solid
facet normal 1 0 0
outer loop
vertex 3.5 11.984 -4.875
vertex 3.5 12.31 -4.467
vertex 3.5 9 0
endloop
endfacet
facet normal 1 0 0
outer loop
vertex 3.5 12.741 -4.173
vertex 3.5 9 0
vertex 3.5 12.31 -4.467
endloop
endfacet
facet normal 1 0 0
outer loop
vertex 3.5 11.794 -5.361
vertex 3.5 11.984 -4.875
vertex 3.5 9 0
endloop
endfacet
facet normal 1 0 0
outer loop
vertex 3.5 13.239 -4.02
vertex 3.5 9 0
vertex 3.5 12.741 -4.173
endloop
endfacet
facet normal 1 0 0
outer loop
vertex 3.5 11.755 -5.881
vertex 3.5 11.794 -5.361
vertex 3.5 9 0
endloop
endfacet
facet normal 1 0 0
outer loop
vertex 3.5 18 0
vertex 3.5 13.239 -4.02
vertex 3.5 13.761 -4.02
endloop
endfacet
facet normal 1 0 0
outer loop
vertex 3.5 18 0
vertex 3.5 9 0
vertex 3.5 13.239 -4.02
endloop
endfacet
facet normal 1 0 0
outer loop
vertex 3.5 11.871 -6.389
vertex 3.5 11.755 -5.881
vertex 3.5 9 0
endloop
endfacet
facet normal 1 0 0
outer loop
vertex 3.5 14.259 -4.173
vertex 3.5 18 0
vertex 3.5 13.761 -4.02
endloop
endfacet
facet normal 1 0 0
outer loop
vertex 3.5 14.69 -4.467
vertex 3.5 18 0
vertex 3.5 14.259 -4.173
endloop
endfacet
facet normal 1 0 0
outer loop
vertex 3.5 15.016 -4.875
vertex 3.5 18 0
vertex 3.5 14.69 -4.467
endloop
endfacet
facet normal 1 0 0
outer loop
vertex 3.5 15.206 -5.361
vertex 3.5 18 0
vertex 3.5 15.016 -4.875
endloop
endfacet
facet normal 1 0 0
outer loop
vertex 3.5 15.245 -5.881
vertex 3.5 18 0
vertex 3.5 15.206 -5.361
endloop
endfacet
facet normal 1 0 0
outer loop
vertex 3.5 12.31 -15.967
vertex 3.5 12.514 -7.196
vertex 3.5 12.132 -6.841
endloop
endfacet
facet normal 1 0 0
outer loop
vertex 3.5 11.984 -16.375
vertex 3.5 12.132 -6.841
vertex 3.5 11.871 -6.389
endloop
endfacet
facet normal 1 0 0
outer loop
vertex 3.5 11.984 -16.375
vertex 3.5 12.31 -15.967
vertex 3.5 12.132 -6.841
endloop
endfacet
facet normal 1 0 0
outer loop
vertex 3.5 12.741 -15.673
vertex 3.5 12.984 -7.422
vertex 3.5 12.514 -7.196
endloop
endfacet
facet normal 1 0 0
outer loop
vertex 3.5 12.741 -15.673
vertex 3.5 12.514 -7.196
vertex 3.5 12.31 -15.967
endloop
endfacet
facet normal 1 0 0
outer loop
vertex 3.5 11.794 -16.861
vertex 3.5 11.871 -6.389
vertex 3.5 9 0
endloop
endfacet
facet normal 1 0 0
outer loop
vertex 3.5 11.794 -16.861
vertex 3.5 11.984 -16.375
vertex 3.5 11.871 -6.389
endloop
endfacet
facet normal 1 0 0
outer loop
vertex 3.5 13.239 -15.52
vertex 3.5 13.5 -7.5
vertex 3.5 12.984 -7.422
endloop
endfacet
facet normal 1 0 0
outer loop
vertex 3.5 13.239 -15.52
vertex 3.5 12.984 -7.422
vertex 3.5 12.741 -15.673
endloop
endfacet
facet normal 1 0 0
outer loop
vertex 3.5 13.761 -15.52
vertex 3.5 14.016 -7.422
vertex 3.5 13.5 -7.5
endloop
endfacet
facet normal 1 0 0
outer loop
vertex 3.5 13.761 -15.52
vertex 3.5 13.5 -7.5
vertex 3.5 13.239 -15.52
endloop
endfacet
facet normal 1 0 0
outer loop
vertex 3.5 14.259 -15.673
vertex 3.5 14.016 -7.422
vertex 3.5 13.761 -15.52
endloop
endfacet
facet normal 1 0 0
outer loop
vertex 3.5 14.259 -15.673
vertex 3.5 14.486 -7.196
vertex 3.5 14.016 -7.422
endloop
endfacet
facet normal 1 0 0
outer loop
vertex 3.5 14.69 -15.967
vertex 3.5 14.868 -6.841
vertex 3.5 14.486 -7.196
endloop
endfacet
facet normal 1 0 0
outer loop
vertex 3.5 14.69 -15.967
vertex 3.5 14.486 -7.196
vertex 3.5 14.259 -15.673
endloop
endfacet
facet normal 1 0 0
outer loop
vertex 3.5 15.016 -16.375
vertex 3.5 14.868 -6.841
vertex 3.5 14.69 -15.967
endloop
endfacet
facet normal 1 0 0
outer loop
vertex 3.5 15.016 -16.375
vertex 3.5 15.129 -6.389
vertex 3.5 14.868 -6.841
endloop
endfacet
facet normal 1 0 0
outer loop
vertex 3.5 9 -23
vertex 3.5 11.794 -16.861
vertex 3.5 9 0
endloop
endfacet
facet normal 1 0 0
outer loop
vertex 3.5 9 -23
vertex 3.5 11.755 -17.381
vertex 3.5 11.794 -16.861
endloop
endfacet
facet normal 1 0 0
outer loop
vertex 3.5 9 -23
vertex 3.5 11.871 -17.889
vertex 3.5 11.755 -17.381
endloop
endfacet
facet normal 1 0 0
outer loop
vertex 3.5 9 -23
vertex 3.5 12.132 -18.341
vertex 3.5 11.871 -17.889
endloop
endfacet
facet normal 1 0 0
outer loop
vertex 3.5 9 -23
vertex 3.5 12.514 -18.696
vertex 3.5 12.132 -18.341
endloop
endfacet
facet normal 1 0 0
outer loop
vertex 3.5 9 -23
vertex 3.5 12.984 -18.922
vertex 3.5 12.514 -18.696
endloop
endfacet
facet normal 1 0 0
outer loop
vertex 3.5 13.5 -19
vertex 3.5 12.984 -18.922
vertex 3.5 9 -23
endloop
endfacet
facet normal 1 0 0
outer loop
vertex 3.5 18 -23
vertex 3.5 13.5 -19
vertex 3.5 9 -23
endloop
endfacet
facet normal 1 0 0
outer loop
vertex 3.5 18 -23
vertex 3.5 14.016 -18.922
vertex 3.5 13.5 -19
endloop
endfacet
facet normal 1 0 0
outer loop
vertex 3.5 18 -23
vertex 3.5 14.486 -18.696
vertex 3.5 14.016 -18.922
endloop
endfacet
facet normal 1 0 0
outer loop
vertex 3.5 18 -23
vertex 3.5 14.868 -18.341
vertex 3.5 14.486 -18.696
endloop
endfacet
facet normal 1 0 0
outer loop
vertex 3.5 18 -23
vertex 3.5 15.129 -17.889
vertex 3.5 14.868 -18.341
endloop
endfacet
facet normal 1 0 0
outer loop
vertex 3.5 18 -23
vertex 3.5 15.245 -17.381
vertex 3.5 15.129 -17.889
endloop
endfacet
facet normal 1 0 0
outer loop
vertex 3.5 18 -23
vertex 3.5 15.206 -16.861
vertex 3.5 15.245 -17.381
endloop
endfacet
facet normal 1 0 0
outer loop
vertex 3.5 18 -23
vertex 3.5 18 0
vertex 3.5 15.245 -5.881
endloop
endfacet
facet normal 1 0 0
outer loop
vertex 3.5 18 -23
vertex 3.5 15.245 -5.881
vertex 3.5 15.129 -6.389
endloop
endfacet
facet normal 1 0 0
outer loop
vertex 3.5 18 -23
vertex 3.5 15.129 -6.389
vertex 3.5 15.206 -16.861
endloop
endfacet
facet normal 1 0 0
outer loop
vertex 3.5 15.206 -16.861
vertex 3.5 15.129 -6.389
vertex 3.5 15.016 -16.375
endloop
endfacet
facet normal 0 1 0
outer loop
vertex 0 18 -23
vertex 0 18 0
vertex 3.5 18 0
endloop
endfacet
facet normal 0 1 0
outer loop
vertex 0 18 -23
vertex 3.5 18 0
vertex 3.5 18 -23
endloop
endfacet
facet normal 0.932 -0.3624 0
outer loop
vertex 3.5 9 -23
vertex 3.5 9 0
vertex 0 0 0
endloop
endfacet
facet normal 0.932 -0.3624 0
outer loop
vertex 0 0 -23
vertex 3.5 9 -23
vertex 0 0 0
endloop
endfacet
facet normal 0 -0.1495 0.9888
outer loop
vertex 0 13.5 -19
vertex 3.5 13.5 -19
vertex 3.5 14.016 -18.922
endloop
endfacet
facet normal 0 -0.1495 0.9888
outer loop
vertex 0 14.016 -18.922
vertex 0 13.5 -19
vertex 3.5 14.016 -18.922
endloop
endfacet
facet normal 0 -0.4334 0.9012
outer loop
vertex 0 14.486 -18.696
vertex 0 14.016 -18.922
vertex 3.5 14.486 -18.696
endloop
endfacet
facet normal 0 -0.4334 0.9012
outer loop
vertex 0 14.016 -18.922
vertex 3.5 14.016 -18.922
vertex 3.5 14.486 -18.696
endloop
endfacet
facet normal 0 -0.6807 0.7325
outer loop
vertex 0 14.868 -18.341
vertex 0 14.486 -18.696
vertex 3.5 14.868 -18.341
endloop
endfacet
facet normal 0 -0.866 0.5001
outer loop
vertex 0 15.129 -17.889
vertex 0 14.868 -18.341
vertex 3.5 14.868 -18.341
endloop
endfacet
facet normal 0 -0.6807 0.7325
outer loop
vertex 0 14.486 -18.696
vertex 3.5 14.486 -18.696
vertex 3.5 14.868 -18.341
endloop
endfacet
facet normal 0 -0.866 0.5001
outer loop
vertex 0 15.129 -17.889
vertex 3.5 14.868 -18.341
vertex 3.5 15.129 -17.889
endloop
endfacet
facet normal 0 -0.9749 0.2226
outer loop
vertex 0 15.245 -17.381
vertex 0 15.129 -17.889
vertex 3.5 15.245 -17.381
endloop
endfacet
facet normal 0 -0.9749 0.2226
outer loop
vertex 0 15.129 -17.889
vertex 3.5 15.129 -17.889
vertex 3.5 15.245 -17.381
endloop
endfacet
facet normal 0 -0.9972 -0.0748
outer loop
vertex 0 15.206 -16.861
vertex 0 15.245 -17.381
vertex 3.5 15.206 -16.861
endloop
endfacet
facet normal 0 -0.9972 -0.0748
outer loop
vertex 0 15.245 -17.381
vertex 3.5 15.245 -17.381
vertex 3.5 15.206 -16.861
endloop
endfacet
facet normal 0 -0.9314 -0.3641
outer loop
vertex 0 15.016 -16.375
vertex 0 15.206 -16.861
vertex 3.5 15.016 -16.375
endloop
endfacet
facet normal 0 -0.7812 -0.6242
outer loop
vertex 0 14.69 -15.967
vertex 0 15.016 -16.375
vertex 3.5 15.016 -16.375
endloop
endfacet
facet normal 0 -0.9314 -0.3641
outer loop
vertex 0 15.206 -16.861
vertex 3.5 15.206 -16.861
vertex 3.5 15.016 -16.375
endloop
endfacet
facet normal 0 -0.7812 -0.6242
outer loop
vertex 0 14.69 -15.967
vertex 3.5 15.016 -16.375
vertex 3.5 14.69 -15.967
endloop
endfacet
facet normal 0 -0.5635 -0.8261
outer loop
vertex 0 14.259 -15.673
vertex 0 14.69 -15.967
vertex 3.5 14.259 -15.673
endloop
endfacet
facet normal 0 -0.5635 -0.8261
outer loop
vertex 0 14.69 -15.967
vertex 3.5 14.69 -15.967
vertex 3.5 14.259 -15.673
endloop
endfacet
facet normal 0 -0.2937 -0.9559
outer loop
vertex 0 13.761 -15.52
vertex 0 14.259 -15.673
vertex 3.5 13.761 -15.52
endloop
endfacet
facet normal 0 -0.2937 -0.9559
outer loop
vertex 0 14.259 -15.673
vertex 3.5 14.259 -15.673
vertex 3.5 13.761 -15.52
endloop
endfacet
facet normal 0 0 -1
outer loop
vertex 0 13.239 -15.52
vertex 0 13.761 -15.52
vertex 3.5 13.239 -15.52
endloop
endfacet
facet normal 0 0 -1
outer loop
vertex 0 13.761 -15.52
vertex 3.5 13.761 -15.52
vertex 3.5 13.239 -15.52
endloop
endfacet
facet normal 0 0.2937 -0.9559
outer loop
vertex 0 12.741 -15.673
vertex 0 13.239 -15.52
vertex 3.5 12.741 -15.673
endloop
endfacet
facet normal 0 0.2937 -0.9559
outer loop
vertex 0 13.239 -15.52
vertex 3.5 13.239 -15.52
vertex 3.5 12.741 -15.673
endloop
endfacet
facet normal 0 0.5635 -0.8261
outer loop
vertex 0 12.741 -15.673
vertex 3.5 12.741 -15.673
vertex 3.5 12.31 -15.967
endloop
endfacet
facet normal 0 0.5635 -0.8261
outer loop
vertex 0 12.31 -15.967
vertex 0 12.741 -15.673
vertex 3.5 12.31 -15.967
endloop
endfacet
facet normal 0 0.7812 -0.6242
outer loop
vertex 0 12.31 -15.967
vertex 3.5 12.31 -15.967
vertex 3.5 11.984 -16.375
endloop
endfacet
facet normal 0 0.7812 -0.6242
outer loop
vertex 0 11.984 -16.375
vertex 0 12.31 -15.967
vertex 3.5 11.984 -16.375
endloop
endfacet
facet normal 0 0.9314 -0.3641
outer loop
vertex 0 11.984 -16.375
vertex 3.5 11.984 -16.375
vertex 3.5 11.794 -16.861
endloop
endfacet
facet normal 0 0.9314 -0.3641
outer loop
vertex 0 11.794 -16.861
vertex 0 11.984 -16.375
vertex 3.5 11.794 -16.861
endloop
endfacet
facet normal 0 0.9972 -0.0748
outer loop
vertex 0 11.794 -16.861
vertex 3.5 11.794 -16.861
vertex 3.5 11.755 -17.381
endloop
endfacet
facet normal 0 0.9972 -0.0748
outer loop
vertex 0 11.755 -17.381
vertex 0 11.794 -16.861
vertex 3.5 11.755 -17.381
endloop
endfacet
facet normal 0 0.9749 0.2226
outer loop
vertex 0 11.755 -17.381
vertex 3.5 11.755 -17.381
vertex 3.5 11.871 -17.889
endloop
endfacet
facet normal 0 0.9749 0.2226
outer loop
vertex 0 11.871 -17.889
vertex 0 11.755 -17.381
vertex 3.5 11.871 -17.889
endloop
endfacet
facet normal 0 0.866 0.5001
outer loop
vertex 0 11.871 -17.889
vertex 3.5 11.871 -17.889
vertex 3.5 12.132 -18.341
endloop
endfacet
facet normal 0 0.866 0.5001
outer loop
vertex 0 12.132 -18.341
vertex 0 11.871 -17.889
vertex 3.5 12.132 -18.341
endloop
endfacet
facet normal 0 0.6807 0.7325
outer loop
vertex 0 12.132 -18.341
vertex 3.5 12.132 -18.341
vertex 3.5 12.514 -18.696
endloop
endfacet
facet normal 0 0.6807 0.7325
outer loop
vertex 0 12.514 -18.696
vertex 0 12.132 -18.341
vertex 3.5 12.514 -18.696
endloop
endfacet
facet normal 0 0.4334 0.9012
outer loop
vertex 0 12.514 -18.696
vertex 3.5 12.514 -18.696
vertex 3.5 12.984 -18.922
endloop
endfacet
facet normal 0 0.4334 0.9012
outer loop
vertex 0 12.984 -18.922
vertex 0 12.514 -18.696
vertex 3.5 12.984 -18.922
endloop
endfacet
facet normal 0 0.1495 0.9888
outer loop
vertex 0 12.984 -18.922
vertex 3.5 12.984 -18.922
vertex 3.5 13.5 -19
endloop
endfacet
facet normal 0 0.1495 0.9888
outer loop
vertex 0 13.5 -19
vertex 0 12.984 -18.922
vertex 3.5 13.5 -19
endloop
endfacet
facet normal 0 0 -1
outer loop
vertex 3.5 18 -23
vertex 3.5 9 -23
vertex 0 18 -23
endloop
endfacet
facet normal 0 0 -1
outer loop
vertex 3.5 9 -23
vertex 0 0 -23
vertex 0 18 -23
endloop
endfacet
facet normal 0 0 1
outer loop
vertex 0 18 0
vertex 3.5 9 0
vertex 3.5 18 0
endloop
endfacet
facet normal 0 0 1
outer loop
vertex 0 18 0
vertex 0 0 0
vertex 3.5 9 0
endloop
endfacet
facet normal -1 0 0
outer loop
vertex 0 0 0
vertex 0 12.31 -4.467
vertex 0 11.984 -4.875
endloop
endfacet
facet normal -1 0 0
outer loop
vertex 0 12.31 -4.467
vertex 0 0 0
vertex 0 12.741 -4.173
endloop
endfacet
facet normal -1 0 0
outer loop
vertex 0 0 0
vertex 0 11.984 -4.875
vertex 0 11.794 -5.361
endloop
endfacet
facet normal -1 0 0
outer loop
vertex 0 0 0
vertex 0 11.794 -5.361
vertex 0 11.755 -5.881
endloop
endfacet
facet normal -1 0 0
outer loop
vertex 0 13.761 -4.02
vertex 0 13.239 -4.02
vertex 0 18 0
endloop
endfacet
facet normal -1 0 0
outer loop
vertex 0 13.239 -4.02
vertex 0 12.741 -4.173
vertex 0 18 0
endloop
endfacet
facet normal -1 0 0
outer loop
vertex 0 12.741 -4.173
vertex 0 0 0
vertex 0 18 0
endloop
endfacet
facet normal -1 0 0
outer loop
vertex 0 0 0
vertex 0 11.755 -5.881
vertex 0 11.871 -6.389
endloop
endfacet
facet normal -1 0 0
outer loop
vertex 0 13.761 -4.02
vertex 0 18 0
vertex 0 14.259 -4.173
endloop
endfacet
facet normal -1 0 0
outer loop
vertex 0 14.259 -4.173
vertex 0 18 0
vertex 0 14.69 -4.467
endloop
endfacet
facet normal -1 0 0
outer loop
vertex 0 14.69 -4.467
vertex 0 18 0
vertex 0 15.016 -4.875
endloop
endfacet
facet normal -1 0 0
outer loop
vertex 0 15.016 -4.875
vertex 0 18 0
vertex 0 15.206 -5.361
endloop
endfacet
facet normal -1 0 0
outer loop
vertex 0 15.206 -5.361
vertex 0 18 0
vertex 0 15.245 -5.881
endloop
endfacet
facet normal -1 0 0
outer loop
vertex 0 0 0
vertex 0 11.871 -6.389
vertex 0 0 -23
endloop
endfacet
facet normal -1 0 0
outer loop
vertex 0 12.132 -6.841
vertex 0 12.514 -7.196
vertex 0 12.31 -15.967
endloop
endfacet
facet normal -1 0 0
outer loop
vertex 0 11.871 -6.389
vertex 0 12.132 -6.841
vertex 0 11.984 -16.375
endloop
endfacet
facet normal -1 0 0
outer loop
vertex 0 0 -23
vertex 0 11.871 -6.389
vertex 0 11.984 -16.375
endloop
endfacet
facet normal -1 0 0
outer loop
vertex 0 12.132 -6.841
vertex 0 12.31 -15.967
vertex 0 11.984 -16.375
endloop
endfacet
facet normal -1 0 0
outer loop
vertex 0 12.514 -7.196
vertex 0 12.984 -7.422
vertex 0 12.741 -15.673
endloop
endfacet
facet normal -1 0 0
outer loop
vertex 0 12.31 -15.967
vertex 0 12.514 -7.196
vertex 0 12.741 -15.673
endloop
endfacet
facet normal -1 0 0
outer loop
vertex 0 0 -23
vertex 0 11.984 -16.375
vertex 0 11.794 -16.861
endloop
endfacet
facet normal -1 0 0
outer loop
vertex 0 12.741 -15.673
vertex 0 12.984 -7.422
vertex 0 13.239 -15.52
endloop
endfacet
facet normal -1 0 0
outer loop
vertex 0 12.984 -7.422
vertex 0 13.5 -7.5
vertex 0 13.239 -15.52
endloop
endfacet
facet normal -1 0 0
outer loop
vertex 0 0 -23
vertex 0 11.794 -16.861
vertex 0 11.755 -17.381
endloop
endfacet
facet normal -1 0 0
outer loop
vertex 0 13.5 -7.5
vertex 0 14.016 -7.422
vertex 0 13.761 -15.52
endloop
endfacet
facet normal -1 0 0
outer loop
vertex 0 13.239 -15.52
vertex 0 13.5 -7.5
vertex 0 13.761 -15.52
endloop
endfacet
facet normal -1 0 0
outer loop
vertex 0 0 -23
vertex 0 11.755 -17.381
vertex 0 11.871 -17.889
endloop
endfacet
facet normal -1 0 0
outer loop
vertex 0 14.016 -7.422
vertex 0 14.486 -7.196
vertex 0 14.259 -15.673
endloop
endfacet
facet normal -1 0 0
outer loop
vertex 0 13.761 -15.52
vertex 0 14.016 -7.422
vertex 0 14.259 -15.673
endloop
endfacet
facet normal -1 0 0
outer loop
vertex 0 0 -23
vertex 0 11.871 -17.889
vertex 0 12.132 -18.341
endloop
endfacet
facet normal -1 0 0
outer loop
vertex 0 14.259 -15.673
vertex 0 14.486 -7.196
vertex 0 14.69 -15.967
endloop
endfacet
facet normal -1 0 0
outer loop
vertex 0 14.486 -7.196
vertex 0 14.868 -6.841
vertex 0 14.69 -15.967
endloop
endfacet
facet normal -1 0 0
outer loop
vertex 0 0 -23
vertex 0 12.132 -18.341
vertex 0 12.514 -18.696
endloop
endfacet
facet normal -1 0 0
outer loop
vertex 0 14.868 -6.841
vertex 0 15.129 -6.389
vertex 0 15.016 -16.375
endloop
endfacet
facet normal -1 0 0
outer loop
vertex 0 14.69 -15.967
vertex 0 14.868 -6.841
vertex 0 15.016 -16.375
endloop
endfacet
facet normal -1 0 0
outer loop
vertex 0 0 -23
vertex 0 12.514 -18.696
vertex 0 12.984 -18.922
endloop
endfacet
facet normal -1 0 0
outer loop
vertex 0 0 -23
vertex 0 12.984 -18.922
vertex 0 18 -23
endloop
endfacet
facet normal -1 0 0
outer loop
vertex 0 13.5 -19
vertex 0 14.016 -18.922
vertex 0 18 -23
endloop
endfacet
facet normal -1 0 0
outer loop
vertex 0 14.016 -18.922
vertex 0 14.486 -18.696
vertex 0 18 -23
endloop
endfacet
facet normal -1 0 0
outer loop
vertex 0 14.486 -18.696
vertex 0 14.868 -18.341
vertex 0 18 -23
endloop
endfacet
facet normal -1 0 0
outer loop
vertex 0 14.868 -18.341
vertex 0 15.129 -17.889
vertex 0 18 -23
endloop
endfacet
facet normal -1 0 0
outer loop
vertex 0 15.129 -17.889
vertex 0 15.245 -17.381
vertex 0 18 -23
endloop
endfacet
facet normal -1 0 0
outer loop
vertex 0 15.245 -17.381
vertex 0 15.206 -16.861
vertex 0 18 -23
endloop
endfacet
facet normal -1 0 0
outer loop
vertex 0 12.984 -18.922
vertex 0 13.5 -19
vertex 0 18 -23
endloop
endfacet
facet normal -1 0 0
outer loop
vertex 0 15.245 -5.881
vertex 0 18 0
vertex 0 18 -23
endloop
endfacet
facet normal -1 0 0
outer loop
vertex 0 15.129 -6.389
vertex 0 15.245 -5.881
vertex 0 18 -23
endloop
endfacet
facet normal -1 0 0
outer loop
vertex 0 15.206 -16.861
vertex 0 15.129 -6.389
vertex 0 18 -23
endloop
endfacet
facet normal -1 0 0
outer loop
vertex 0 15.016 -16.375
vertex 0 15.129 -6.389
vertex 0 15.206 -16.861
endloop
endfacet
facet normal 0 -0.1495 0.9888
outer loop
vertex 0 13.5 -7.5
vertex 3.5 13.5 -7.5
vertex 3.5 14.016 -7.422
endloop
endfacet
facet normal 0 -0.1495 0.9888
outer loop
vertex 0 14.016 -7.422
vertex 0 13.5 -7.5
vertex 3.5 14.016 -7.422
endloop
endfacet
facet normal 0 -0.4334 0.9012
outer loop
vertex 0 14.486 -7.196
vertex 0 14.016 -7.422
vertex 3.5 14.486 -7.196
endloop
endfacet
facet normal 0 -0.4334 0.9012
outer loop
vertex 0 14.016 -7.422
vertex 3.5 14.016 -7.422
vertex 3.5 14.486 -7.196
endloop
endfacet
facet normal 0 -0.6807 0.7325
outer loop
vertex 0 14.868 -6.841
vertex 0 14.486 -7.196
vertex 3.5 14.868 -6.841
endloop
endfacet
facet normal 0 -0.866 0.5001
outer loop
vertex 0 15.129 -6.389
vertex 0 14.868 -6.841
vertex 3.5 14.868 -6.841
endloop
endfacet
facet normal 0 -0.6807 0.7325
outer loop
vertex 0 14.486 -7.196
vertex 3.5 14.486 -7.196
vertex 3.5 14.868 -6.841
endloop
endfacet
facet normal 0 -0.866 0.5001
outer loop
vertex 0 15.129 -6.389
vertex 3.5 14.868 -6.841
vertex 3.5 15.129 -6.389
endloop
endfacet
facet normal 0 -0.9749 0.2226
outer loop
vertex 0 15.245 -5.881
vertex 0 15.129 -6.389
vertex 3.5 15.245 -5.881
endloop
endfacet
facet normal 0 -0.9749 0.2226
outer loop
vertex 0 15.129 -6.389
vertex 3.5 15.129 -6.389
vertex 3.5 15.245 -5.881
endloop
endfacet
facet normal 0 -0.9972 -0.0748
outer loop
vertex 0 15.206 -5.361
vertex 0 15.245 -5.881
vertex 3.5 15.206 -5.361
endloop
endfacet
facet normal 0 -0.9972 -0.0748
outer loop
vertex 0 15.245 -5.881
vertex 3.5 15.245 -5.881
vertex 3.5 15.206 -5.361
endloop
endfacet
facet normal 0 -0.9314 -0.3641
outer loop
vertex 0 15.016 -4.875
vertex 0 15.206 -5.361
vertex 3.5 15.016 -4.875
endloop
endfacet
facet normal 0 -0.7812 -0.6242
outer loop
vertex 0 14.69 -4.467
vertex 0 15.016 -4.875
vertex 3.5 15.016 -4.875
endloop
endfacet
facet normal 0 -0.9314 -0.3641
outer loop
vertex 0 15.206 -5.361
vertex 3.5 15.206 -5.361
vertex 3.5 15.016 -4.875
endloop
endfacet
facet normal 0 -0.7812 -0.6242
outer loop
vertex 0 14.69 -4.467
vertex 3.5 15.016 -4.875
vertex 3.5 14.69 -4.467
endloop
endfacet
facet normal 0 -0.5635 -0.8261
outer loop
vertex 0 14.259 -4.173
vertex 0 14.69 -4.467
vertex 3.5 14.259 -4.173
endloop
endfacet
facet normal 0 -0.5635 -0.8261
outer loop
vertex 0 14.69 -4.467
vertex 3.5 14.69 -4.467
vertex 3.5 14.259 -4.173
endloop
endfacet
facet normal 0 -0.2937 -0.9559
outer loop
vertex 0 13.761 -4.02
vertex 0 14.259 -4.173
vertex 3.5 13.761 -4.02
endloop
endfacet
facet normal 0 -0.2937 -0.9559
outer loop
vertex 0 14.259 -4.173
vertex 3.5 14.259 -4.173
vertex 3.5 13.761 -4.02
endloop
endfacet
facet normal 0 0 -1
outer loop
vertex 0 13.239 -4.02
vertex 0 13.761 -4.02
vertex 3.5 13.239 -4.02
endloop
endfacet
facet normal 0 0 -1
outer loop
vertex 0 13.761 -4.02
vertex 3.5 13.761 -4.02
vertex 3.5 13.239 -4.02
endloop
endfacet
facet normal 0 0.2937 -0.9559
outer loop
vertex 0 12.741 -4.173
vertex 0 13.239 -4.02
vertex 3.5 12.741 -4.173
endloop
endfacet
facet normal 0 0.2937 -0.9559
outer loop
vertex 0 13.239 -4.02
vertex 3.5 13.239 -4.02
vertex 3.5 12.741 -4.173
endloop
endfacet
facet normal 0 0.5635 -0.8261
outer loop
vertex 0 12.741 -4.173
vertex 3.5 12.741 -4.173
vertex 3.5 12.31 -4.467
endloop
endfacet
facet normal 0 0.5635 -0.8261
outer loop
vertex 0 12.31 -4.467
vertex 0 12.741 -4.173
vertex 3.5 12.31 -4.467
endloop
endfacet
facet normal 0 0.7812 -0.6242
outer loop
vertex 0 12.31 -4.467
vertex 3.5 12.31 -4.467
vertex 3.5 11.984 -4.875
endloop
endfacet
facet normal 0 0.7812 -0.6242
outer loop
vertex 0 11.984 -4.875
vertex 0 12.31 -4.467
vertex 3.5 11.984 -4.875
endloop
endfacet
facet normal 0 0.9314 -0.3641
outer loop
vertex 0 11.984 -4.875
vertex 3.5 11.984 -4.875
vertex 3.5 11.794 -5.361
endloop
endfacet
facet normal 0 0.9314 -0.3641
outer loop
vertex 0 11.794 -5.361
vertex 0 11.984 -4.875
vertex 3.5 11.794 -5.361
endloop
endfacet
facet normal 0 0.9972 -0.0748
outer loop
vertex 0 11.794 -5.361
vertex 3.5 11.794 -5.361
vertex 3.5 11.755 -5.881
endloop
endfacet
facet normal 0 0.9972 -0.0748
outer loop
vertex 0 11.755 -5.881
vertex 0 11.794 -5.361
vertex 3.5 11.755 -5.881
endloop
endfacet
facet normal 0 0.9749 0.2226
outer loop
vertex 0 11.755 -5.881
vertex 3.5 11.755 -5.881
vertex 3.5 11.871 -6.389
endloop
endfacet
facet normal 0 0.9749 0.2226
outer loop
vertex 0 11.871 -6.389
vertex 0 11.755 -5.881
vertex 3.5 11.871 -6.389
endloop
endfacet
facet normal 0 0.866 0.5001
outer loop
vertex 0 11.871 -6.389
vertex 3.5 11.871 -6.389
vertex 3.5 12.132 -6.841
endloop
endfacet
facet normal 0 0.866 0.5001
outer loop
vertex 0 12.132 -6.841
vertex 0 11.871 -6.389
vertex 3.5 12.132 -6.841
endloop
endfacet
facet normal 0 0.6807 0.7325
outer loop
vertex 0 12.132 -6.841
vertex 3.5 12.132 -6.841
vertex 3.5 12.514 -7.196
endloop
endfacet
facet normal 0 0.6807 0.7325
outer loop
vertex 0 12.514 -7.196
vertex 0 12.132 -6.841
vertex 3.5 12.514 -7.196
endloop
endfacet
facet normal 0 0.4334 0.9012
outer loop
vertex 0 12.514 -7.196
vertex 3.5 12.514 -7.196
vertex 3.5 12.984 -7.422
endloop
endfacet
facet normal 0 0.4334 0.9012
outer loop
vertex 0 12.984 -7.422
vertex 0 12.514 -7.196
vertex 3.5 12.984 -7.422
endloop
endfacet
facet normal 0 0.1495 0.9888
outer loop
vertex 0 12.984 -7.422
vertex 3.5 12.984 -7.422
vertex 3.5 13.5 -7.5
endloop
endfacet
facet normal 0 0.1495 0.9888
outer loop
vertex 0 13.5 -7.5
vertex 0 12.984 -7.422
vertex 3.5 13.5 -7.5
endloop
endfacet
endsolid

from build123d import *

# Parameters (mm, degrees)
SKETCH1_W           = 23
SKETCH1_H           = 18
BOSS_EXTRUDE1_DEPTH = 3.5
CUT_EXTRUDE1_DEPTH  = 30.41513216
SKETCH3_R           = 1.75
CUT_EXTRUDE3_DEPTH  = 30.41513216


with BuildPart() as part:
    # Sketch1 → Boss-Extrude1 (new body)
    with BuildSketch(Plane(origin=(0, 0, 0), x_dir=(0, 0, -1), z_dir=(1, 0, 0))):
        with Locations((11.5, 9)):
            Rectangle(SKETCH1_W, SKETCH1_H)
    extrude(amount=BOSS_EXTRUDE1_DEPTH)

    # Sketch2 → Cut-Extrude1 (cut, through all)
    with BuildSketch(Plane.XY):
        Polygon((3.5, 9), (0, 0), (3.5, 0), align=None)
    extrude(amount=-CUT_EXTRUDE1_DEPTH, mode=Mode.SUBTRACT)

    # Sketch3 → Cut-Extrude3 (cut, through all)
    with BuildSketch(Plane(origin=(3.5, 0, 0), x_dir=(0, 0, -1), z_dir=(1, 0, 0))):
        with Locations((5.75, 13.5)):
            Circle(SKETCH3_R)
        with Locations((17.25, 13.5)):
            Circle(SKETCH3_R)
    extrude(amount=-CUT_EXTRUDE3_DEPTH, mode=Mode.SUBTRACT)


solid = part.part
